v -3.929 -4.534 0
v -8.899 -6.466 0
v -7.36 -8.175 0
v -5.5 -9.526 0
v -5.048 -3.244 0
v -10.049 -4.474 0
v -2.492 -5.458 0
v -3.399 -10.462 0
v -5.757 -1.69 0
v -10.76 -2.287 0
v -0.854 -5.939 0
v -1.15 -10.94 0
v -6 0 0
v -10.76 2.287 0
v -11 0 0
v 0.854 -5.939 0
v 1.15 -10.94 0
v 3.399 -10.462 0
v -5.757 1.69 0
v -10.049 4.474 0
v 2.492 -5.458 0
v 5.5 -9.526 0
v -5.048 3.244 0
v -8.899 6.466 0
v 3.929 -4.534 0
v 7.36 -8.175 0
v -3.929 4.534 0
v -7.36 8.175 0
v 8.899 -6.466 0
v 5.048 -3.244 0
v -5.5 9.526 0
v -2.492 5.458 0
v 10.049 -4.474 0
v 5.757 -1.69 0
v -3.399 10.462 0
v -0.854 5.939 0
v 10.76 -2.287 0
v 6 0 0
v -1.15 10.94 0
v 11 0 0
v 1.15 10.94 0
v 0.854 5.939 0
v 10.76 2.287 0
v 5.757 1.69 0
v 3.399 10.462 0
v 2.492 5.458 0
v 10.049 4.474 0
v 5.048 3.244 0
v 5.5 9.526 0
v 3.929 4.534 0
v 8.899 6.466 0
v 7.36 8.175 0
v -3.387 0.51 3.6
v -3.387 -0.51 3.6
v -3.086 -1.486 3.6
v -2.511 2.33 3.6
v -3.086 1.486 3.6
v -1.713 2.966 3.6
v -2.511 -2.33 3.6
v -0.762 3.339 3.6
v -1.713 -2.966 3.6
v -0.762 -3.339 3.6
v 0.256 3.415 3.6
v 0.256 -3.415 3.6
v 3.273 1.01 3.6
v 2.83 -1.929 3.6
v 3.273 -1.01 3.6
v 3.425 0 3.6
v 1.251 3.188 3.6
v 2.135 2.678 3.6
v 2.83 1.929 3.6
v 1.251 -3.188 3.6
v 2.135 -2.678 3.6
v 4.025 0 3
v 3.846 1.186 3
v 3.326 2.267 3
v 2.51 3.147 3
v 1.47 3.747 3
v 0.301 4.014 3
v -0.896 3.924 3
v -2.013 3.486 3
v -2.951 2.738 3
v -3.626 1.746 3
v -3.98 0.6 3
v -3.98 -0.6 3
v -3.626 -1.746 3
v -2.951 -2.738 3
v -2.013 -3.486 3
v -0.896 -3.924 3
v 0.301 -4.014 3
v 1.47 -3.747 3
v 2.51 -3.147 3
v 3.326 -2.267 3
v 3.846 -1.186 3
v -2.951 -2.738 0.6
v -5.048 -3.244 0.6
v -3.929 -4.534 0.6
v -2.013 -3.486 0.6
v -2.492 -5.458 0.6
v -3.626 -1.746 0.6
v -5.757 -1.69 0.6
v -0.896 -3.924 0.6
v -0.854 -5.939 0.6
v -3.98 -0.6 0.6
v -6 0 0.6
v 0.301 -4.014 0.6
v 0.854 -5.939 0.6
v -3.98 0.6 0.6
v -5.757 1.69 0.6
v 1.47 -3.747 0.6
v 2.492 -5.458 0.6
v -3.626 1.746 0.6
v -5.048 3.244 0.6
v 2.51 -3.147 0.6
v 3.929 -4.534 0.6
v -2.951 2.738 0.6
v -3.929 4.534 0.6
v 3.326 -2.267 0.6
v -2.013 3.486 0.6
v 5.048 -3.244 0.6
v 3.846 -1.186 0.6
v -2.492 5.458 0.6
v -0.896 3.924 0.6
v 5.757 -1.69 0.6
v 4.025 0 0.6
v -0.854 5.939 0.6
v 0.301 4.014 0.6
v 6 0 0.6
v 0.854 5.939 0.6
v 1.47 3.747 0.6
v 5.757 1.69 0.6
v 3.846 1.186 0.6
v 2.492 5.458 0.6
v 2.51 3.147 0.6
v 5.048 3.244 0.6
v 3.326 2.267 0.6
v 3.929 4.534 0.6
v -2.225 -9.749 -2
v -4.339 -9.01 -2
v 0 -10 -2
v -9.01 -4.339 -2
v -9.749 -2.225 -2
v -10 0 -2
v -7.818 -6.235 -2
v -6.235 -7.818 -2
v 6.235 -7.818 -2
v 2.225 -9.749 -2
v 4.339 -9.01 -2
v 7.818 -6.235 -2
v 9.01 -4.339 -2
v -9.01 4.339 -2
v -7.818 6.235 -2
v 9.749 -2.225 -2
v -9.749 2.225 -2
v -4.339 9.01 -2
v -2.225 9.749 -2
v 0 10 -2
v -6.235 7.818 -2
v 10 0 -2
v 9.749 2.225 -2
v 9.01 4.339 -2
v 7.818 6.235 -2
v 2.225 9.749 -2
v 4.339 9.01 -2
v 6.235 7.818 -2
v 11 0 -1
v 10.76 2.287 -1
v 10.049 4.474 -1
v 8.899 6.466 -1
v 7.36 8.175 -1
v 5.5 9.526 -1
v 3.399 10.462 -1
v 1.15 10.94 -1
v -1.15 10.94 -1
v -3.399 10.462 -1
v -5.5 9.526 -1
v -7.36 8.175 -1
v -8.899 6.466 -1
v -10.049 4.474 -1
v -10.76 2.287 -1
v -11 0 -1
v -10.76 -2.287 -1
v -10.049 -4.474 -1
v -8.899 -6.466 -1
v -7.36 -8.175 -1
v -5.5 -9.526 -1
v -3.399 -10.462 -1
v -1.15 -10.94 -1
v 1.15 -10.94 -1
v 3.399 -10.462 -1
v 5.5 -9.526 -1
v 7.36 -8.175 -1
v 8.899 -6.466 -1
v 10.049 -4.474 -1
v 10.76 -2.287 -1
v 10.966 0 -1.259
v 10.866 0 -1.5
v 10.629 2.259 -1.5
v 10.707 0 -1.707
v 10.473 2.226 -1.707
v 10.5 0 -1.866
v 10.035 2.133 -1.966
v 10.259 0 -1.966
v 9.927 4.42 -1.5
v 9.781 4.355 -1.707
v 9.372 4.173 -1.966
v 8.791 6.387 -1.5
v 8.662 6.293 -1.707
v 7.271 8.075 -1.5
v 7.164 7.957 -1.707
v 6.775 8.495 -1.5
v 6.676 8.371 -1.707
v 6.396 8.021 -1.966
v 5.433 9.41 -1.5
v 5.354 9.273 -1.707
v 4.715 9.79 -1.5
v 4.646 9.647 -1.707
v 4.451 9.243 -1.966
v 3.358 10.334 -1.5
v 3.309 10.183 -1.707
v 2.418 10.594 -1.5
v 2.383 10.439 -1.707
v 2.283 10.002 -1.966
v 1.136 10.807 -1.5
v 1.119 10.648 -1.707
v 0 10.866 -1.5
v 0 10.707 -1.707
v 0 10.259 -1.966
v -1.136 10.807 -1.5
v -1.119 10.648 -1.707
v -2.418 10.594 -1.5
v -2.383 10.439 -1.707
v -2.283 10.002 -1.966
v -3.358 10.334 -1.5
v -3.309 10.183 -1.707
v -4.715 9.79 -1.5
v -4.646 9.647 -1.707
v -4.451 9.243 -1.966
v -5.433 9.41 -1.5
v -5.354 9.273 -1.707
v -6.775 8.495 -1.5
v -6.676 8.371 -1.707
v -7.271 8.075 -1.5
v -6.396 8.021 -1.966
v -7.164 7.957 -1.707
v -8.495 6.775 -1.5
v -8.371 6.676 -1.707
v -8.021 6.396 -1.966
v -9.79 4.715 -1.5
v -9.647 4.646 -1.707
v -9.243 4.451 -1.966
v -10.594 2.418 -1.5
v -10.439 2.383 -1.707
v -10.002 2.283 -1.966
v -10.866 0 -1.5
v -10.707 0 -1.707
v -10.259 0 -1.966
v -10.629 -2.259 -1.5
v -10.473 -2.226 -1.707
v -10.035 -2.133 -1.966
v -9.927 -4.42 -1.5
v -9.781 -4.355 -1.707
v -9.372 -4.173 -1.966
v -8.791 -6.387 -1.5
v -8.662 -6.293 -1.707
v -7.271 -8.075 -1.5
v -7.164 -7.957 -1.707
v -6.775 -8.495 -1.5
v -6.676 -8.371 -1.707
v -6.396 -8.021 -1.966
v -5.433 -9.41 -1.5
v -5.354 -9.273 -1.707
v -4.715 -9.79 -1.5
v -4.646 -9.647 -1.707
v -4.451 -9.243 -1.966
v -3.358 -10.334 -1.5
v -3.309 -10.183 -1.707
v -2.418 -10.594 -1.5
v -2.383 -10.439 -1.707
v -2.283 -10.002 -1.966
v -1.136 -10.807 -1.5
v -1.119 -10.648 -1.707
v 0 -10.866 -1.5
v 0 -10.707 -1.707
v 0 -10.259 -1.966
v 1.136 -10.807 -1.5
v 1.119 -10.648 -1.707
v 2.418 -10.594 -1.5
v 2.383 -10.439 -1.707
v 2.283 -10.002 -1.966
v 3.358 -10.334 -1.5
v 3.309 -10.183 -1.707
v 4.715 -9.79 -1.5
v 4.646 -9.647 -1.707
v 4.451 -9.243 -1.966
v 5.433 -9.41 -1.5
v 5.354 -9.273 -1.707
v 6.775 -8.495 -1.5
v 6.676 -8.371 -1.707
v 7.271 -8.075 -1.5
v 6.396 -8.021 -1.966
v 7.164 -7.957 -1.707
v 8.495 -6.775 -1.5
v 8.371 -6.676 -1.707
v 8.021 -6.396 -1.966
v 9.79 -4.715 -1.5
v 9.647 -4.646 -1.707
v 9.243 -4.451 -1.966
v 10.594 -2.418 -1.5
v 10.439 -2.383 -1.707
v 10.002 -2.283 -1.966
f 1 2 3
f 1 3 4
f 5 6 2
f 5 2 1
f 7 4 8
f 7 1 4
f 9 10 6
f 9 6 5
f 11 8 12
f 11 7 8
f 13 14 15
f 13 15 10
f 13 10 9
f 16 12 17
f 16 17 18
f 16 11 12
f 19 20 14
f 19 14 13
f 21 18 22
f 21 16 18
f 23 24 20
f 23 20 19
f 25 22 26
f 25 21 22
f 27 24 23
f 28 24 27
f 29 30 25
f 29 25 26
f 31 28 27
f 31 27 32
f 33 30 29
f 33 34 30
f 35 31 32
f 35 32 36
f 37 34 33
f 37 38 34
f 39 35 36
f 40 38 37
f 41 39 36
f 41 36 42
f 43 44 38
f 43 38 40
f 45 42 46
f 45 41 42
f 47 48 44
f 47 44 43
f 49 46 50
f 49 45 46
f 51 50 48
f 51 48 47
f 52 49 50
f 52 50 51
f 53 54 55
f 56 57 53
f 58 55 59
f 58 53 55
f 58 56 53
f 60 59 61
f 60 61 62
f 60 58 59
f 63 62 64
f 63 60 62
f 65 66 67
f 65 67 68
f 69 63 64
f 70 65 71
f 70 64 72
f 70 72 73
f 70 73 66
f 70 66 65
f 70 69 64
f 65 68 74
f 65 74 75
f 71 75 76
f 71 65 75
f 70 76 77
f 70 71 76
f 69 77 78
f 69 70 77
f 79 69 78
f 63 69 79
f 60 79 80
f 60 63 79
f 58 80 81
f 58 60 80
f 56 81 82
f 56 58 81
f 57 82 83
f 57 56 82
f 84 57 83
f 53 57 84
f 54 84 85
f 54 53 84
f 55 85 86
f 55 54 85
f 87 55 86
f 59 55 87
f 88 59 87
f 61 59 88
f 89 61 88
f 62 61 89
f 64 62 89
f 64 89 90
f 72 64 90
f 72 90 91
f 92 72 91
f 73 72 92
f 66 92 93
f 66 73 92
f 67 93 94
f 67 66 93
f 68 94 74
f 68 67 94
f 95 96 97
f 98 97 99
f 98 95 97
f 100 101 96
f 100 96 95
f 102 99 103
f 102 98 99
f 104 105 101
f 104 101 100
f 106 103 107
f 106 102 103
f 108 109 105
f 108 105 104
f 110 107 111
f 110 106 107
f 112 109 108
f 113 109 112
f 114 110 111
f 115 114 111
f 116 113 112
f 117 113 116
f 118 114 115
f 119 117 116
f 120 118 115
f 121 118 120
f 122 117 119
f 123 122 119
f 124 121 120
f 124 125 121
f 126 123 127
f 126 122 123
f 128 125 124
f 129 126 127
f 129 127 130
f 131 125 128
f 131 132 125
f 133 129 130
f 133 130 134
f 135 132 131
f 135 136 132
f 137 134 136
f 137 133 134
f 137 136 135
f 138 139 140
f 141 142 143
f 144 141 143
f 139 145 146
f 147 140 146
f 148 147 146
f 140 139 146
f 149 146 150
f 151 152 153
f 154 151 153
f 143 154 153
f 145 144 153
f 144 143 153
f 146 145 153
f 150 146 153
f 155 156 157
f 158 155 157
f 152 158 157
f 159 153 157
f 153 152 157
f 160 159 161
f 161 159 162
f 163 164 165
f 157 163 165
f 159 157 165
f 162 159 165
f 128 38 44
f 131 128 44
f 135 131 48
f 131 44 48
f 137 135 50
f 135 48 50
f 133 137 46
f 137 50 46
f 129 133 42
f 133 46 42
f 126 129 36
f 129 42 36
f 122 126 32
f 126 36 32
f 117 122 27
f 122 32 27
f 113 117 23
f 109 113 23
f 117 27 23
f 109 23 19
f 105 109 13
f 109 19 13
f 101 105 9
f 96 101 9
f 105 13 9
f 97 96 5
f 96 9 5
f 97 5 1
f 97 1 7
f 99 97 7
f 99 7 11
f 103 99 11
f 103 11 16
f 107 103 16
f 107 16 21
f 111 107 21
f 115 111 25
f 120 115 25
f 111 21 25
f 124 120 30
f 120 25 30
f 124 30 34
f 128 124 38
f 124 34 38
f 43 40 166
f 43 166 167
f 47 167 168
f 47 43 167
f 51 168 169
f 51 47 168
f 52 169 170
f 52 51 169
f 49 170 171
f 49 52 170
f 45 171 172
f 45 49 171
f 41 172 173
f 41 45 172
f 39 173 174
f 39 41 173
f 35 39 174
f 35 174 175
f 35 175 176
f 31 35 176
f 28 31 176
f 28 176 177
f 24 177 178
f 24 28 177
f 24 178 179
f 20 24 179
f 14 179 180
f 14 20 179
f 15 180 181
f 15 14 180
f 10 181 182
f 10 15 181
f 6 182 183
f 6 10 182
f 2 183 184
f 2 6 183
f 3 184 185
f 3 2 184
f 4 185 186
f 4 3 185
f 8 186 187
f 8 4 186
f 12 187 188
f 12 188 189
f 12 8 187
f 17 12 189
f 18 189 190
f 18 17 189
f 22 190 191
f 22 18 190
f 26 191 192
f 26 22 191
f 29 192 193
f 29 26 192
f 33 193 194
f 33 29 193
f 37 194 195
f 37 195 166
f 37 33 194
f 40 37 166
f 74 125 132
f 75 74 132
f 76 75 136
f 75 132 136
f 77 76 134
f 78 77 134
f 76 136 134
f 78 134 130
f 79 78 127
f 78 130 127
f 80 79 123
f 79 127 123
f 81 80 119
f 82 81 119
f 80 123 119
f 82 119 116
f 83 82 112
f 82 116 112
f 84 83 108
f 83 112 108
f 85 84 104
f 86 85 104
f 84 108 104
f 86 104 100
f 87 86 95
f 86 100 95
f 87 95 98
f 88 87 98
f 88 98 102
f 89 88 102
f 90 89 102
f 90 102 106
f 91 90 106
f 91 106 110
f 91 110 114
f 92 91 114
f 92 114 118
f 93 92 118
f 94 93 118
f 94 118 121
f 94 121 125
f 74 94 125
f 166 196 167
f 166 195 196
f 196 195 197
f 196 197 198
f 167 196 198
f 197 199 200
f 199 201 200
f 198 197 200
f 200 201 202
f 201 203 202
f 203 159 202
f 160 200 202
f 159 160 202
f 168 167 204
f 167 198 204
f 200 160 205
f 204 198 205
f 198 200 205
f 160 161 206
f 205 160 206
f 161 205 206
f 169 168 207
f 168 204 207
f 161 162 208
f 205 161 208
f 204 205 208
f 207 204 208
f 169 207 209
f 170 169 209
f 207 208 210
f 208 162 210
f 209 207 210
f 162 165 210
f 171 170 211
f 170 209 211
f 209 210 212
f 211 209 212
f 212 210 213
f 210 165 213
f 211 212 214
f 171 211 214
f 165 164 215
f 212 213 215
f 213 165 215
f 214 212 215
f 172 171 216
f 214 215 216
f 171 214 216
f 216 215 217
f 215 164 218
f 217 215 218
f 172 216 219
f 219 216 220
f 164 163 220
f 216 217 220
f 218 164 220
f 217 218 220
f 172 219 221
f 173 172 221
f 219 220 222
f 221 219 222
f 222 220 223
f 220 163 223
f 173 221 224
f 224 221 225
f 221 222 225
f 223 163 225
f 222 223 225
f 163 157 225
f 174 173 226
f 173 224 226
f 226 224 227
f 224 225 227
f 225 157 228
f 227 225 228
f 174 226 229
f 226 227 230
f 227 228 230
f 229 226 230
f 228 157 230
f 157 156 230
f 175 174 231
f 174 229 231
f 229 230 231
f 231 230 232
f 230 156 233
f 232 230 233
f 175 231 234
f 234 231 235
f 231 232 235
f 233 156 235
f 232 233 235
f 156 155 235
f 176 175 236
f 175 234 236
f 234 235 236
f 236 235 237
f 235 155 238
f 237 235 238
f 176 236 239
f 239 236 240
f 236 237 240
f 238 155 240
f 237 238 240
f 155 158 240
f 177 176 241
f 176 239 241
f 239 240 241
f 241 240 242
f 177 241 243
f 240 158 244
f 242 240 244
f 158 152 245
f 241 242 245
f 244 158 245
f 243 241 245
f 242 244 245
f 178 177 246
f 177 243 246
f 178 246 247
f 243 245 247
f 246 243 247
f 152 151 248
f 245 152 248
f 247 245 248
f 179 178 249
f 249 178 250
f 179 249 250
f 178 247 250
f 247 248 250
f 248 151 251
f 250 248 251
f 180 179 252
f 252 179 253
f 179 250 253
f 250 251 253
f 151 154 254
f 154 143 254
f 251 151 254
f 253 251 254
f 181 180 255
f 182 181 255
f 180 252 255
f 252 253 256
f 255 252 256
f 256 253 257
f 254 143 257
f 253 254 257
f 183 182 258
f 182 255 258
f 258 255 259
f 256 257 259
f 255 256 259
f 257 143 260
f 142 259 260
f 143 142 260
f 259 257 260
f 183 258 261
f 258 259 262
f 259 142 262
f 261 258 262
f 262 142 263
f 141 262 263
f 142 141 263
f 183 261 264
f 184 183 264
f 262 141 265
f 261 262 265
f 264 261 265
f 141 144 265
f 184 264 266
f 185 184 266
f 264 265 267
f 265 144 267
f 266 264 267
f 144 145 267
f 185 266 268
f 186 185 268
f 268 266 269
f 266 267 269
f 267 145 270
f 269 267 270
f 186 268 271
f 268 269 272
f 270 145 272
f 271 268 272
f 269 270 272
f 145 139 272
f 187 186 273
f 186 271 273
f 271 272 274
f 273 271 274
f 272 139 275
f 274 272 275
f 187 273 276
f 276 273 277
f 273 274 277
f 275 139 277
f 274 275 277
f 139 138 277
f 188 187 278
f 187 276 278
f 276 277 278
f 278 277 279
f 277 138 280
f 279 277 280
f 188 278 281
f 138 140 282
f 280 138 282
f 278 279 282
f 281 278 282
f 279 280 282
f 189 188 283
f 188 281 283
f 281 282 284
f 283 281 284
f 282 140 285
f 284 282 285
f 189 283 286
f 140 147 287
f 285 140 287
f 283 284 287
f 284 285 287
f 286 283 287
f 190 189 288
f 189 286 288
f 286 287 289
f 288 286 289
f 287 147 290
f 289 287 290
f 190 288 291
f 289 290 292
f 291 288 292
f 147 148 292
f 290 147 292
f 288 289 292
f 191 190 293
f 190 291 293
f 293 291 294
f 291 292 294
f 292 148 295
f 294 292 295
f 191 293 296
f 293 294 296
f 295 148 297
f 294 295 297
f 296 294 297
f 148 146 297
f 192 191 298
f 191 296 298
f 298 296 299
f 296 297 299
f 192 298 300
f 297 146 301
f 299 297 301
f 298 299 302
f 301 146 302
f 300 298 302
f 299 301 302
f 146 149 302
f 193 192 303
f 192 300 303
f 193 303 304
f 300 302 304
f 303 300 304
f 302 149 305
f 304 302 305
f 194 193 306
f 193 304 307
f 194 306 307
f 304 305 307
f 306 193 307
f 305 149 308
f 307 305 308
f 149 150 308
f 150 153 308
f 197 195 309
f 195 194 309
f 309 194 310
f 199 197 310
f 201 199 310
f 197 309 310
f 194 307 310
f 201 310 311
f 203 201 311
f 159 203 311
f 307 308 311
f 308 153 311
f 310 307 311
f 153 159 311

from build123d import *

# Parameters (mm, degrees)
F0_R     = 11
F0_R_2   = 6
F0_R_3   = 4.025
F1_DEPTH = 2
F2_DEPTH = 0.6
F3_DEPTH = 3.6
F4_R     = 1
F5_SIZE  = 0.6


with BuildPart() as f1:
    # F0 (on Top) → F1 (new body)
    with BuildSketch(Plane.XY):
        Circle(F0_R)
        Circle(F0_R_2, mode=Mode.SUBTRACT)
        Circle(F0_R_2)
        Circle(F0_R_3, mode=Mode.SUBTRACT)
        Circle(F0_R_3)
    extrude(amount=-F1_DEPTH)

    # F0 (on Top) → F2 (join)
    with BuildSketch(Plane.XY):
        Circle(F0_R_2)
        Circle(F0_R_3, mode=Mode.SUBTRACT)
    extrude(amount=F2_DEPTH)

    # F0 (on Top) → F3 (join)
    with BuildSketch(Plane.XY):
        Circle(F0_R_3)
    extrude(amount=F3_DEPTH)

    # F4
    f4_edges = [f1.edges().sort_by_distance(p)[0] for p in [
        (-11, 0, -2),
    ]]
    fillet(f4_edges, radius=F4_R)

    # F5
    f5_edges = [f1.edges().sort_by_distance(p)[0] for p in [
        (-4.025, 0, 3.6),
    ]]
    chamfer(f5_edges, length=F5_SIZE)


solid = f1.part
